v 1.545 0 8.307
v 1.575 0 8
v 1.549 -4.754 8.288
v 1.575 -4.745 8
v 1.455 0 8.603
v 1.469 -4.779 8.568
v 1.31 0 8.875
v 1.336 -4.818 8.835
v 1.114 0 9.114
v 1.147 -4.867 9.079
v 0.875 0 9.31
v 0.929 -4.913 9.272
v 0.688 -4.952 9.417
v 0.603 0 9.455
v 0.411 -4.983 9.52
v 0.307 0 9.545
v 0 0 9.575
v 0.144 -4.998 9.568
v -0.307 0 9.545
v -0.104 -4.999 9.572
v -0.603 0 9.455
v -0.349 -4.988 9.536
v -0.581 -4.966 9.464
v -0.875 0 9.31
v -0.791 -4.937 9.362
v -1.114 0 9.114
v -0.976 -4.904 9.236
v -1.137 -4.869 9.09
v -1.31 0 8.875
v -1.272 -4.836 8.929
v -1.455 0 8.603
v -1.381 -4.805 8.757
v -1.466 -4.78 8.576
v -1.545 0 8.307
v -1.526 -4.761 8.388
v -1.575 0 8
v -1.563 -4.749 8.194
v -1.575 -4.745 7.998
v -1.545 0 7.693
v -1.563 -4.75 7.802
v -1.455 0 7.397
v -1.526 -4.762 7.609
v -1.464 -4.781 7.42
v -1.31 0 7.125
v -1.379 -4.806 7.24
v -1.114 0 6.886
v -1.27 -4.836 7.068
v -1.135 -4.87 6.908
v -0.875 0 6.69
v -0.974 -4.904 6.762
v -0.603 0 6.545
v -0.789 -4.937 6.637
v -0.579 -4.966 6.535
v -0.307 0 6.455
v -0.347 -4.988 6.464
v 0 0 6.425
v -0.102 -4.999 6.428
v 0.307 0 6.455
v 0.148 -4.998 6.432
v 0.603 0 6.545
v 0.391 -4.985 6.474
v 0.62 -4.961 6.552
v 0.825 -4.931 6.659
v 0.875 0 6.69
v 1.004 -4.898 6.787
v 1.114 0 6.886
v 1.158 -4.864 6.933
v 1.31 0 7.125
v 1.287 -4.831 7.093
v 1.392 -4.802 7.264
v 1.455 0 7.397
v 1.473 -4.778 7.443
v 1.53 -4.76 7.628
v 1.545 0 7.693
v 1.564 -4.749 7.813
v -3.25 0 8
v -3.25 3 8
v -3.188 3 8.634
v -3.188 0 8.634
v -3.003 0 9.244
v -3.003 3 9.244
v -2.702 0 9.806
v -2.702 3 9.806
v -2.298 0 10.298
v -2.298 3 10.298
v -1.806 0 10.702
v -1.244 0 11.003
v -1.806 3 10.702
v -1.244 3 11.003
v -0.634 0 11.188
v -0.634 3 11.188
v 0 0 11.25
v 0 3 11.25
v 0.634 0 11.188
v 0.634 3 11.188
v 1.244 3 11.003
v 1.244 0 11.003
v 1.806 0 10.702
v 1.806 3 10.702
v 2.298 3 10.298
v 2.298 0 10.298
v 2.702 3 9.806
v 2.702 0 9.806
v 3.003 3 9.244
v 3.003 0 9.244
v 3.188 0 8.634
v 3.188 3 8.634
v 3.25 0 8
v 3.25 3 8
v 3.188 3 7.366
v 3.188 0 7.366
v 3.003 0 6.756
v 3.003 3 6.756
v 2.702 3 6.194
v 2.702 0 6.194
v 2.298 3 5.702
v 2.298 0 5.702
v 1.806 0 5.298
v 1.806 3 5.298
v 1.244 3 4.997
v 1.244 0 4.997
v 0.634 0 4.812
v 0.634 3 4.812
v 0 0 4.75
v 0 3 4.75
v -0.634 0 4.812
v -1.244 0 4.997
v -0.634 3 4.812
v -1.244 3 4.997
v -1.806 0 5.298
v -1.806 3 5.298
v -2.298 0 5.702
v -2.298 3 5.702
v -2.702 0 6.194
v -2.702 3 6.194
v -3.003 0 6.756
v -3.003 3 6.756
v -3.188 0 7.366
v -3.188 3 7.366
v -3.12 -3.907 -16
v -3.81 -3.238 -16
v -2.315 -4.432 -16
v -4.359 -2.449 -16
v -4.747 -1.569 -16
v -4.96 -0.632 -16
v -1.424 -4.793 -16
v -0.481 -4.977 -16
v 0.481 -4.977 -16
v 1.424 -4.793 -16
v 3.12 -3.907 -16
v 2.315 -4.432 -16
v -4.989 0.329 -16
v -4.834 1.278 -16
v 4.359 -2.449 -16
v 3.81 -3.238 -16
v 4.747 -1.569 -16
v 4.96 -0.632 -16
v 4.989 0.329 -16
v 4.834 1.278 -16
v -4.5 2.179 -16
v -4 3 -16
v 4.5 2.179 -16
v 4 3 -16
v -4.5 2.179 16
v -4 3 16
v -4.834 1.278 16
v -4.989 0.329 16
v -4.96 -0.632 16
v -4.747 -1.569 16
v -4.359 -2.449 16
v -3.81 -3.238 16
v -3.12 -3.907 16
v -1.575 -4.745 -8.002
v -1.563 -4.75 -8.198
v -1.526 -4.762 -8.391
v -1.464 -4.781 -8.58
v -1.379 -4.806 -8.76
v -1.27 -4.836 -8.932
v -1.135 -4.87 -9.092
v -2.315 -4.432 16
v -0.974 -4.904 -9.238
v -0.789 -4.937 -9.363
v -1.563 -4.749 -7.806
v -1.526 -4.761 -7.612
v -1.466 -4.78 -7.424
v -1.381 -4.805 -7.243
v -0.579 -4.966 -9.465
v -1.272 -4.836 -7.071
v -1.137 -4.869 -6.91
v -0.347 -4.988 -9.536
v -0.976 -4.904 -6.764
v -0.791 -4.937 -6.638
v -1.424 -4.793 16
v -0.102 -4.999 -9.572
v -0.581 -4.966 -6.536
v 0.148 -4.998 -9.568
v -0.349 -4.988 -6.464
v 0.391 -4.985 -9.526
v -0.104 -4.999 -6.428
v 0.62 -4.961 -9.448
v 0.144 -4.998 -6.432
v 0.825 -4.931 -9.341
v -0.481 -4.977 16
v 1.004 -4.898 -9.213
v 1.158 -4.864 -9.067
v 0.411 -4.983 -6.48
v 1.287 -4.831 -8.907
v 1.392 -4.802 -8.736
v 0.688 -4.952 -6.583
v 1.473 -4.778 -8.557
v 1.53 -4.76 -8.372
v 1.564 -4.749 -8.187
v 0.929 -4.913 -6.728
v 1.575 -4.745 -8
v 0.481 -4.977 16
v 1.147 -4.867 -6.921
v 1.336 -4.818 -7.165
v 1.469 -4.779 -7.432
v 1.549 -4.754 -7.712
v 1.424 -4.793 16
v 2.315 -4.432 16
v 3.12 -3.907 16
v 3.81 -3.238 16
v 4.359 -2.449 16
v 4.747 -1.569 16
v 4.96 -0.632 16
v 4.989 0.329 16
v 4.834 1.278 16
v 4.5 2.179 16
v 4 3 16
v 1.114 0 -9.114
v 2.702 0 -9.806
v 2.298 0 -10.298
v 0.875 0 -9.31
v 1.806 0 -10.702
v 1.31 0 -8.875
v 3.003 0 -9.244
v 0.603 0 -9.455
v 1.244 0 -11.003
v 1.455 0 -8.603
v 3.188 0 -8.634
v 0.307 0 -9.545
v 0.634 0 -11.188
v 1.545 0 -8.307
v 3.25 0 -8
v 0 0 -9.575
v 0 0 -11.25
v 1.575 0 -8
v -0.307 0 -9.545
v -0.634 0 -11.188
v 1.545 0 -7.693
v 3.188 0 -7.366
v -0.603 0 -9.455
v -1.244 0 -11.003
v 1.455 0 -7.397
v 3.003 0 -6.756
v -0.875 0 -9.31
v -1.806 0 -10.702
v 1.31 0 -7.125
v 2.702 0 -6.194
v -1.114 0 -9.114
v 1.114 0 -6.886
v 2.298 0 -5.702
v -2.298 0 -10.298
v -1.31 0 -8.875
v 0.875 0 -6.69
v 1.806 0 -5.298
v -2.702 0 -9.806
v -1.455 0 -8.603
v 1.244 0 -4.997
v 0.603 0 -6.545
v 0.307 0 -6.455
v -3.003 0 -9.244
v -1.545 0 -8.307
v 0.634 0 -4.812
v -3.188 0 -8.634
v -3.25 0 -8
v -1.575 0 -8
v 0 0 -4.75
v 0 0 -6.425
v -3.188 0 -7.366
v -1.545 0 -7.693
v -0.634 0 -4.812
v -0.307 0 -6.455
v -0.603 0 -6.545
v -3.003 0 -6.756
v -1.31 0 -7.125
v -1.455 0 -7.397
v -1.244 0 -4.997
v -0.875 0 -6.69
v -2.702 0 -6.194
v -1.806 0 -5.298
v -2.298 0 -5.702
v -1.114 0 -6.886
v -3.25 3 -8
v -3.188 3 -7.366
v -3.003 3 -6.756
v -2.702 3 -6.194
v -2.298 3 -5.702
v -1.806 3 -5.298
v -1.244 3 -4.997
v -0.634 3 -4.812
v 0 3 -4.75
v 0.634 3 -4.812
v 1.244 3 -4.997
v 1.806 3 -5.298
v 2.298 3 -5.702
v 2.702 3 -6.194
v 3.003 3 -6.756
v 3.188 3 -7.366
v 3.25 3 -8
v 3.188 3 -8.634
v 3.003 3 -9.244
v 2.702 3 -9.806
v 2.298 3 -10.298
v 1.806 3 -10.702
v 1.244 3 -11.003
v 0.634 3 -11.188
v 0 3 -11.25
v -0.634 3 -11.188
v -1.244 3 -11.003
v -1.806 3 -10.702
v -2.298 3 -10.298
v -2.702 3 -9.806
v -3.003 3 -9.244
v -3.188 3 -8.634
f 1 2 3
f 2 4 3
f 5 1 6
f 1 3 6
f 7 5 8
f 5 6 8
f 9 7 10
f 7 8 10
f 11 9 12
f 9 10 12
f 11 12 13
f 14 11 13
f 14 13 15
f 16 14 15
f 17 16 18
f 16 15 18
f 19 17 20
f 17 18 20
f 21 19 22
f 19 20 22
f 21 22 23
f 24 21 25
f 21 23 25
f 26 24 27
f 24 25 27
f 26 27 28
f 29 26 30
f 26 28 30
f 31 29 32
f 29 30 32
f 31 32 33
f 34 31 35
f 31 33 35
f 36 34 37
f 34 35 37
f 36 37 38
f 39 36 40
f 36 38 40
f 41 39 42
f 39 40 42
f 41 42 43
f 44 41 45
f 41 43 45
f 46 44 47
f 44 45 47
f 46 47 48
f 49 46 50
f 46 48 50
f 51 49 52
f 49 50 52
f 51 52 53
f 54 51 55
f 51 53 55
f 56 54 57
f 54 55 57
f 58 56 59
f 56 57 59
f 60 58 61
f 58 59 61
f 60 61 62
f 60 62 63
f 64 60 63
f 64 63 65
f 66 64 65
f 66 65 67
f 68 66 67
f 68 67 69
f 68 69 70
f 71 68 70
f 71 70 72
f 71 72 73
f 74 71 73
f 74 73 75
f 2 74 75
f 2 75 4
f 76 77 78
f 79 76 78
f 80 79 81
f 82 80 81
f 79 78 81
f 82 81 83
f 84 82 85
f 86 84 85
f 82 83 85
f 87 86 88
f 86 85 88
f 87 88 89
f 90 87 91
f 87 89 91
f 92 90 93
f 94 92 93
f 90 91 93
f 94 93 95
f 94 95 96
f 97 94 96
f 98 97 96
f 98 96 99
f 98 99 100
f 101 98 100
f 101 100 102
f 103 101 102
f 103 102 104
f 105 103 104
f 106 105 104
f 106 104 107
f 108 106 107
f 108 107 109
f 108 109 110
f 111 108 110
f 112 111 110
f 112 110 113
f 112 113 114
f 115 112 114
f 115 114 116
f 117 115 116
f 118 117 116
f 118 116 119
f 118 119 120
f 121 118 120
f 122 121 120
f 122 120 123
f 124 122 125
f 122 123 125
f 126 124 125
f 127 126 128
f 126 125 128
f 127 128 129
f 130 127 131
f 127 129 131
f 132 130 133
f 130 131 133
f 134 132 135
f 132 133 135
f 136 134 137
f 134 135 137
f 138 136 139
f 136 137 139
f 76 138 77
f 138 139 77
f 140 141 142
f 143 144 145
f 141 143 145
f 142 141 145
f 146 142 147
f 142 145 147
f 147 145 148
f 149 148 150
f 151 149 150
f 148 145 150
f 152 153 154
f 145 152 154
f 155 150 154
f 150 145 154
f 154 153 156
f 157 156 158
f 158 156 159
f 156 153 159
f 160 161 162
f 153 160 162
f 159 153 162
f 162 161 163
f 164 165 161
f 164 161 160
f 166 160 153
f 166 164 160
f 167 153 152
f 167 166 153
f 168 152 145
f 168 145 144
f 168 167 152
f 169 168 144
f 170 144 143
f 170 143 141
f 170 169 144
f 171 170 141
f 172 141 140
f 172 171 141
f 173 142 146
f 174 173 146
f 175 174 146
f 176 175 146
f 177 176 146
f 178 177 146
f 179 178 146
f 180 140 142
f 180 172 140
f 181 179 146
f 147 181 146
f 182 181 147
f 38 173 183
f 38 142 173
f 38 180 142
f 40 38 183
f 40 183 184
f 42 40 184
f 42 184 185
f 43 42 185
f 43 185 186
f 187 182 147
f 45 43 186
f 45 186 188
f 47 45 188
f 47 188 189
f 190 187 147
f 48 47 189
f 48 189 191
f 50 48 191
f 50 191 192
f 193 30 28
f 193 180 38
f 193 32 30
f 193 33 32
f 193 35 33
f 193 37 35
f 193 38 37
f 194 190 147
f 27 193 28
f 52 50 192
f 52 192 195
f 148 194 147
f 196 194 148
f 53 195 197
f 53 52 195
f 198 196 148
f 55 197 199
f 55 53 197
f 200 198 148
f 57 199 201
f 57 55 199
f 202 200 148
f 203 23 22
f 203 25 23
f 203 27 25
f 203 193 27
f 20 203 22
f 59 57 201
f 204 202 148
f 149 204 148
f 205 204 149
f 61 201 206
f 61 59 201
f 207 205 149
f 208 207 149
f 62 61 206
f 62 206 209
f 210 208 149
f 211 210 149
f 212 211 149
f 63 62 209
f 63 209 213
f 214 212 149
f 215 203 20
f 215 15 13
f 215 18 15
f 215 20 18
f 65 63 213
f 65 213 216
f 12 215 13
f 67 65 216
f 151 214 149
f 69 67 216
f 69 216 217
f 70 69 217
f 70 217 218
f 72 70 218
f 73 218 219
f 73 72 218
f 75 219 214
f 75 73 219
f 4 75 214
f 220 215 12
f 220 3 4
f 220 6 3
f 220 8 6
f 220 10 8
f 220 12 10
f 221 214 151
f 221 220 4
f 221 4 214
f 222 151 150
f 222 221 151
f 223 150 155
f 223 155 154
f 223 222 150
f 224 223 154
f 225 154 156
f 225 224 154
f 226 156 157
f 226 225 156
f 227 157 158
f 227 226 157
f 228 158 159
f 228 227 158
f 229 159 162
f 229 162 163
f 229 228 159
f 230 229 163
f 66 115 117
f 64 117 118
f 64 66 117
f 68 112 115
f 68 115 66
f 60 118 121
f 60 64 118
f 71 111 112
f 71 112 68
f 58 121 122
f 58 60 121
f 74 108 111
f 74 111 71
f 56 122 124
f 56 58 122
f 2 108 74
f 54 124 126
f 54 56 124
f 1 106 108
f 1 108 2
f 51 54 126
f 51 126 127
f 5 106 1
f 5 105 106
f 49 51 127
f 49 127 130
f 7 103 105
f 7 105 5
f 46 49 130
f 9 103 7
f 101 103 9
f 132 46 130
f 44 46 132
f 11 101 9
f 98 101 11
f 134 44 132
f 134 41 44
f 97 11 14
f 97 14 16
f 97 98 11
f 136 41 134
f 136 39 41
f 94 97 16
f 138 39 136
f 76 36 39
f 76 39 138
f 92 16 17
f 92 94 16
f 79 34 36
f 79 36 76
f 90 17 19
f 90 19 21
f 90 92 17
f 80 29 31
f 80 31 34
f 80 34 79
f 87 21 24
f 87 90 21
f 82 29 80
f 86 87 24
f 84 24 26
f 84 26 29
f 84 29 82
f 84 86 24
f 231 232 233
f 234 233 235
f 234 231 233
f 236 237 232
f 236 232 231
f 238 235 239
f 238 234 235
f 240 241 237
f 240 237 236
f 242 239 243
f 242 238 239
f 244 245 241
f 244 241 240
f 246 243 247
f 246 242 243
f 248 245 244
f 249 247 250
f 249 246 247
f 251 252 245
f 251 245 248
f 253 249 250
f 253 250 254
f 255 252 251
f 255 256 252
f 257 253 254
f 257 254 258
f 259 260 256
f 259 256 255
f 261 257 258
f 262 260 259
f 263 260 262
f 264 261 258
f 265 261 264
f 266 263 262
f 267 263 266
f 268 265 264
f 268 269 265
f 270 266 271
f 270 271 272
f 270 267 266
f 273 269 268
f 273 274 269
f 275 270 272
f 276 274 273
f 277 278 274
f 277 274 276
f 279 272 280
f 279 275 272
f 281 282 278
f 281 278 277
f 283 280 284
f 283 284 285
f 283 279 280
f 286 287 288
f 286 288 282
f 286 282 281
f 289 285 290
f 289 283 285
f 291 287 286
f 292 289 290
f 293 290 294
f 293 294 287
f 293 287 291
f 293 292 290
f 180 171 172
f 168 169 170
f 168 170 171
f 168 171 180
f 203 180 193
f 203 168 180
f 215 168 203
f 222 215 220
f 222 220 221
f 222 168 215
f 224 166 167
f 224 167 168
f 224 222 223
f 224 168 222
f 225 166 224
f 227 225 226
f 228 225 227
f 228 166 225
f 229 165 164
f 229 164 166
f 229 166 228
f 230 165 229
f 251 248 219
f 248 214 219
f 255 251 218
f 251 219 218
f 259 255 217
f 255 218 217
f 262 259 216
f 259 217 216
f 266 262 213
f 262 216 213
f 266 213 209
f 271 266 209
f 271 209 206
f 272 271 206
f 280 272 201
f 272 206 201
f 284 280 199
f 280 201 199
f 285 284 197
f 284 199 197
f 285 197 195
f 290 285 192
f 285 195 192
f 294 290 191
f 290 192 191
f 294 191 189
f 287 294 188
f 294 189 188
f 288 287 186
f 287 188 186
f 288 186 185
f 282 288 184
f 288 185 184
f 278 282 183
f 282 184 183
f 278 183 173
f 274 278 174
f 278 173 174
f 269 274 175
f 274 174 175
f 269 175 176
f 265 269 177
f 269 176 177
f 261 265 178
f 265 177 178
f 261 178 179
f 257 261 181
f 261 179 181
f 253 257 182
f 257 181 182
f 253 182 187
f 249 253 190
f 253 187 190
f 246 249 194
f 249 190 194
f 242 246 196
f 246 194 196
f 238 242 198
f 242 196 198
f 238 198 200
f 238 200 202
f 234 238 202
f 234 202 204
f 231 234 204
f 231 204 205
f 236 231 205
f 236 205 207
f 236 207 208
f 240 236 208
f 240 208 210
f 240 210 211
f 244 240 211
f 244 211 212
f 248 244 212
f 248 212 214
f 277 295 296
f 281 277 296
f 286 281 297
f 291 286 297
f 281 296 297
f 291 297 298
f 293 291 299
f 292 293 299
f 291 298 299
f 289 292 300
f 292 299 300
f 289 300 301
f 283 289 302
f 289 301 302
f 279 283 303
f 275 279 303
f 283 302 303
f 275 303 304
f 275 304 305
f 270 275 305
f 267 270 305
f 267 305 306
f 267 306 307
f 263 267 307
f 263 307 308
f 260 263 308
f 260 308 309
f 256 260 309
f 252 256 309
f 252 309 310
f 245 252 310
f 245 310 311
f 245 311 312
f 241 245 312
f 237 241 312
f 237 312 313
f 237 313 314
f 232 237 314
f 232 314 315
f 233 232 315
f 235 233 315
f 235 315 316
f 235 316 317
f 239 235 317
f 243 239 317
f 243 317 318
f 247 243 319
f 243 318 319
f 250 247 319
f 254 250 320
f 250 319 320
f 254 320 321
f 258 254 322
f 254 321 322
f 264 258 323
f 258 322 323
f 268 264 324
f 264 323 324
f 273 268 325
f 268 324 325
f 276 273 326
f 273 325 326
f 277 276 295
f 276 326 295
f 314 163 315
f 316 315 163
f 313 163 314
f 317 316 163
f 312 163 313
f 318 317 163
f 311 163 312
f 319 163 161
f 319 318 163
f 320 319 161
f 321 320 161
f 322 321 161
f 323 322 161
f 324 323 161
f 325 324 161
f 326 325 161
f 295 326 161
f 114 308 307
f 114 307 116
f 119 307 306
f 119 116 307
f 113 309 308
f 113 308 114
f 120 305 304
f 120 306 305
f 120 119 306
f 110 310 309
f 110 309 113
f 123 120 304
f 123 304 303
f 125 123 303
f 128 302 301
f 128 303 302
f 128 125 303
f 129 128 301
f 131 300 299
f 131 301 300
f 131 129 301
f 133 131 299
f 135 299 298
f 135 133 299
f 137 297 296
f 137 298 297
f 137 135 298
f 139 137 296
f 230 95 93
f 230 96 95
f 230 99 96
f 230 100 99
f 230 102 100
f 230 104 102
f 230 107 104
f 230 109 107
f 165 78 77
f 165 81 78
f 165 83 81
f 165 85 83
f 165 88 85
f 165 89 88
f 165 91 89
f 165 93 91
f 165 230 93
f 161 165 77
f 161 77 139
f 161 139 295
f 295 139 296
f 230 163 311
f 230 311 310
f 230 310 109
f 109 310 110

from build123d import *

# Parameters (mm, degrees)
F1_DEPTH       = 16
F3_D           = 3.15
F3_CBORE_D     = 6.5
F3_CBORE_DEPTH = 3


with BuildPart() as f1:
    # F0 (on Top) → F1 (new body, symmetric)
    with BuildSketch(Plane.XY):
        with BuildLine():
            Line((4, 3), (-4, 3))
            ThreePointArc((-4, 3), (0, -5), (4, 3))
        make_face()
    extrude(amount=F1_DEPTH, both=True)

    # F3 (through all)
    with Locations(Plane(origin=(0, 3, 0), x_dir=(-1, 0, 0), z_dir=(0, 1, 0))):
        with Locations((0, 8), (0, -8)):
            CounterBoreHole(F3_D / 2, F3_CBORE_D / 2, F3_CBORE_DEPTH)


solid = f1.part
